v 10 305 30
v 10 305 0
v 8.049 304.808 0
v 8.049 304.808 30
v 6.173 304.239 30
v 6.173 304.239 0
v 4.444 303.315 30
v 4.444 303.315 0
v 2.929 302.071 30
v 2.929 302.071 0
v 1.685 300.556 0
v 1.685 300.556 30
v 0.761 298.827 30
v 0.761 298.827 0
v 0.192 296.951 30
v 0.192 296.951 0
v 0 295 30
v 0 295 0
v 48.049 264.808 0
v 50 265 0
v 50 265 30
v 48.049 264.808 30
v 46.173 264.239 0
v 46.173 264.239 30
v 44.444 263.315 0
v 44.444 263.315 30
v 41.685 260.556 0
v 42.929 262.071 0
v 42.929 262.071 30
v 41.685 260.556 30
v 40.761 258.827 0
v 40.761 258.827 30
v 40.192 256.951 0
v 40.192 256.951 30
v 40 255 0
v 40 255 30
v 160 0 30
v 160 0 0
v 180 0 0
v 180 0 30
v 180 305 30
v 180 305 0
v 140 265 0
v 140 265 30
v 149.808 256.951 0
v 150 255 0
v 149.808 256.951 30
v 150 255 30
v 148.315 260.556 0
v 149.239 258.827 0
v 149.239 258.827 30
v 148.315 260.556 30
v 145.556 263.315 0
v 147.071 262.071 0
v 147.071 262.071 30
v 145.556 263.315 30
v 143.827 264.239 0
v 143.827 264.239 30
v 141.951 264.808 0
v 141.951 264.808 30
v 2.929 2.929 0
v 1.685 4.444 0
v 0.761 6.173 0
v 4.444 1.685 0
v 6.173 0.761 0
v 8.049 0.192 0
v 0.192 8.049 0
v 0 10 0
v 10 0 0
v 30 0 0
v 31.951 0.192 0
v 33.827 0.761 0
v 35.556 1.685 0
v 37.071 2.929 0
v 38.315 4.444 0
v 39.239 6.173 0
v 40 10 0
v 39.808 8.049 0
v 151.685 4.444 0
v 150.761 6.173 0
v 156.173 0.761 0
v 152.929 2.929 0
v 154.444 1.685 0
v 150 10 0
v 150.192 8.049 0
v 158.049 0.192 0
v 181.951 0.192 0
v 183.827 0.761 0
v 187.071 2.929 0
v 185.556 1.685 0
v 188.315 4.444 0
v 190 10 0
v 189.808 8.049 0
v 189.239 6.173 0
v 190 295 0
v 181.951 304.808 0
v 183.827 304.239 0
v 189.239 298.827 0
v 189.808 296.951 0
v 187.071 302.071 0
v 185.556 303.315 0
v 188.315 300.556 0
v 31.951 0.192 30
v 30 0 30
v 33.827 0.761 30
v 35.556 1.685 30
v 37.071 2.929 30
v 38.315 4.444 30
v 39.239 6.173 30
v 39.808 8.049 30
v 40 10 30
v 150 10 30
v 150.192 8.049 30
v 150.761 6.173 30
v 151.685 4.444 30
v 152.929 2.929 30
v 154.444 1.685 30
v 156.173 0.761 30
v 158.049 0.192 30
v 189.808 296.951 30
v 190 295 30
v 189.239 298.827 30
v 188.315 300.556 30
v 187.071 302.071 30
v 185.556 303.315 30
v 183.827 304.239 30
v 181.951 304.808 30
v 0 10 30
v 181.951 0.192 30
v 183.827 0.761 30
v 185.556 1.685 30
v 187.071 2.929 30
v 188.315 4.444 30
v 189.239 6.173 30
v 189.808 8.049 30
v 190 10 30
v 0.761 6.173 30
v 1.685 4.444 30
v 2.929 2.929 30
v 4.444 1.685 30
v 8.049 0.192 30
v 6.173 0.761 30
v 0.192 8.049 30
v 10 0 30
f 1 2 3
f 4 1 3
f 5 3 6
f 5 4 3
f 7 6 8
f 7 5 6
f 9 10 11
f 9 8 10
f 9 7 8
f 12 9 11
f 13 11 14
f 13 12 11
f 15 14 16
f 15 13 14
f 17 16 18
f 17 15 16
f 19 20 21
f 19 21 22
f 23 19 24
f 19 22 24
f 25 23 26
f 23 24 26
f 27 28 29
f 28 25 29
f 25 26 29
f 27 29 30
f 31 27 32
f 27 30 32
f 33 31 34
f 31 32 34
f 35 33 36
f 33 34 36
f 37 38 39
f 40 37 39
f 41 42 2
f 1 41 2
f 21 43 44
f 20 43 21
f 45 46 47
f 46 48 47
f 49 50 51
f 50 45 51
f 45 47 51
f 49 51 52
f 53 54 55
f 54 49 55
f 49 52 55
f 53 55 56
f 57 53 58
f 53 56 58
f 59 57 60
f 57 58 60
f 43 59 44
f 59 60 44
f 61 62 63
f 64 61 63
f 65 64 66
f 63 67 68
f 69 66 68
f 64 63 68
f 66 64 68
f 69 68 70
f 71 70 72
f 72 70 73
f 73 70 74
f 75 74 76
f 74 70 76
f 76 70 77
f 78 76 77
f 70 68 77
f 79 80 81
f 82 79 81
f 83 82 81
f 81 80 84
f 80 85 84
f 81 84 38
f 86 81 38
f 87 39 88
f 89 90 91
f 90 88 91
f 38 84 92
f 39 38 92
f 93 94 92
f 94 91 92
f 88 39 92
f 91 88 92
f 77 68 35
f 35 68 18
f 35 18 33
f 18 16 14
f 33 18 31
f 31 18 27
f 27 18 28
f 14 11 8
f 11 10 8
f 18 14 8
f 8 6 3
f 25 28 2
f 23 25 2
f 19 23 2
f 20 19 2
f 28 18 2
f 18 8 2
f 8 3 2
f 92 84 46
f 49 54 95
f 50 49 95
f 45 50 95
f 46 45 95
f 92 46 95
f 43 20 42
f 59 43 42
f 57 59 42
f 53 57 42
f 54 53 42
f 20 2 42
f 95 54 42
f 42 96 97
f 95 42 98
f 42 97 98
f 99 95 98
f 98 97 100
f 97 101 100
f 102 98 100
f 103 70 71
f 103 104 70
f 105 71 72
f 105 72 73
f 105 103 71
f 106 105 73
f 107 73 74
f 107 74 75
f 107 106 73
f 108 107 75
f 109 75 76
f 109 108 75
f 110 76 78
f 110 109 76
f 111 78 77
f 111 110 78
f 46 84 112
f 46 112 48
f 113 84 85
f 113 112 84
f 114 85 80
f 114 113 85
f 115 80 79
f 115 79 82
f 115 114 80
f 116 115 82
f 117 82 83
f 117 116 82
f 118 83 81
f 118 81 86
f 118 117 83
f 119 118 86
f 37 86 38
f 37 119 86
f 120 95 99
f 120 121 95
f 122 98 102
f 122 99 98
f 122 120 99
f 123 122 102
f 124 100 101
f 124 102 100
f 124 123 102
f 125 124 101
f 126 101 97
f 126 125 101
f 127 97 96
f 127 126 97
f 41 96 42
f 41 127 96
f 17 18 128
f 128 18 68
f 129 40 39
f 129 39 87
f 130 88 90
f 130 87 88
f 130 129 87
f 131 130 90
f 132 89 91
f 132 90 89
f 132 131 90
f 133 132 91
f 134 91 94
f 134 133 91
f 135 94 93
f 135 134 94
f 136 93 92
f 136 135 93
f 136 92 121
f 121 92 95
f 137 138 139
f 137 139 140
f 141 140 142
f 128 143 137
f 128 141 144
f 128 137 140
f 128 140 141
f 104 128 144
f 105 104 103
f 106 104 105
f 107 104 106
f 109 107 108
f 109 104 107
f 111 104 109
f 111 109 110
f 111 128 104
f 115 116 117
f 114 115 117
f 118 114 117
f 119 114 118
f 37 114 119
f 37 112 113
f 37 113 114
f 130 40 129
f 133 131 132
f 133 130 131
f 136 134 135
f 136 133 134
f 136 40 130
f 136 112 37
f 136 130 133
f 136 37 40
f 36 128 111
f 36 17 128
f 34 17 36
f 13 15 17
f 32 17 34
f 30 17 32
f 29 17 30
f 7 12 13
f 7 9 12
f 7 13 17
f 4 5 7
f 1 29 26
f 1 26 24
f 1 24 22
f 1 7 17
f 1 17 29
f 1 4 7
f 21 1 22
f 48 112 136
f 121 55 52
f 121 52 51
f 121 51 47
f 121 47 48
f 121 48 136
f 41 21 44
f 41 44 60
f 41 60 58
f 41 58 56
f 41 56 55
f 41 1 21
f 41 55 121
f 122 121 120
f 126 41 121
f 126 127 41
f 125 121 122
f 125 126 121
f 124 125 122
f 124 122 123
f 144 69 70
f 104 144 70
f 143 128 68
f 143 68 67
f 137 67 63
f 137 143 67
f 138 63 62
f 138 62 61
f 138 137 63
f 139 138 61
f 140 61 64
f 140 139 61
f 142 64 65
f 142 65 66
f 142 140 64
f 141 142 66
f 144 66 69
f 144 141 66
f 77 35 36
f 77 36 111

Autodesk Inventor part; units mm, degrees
ref_plane "YZ Plane" through (0, 0, 0) normal (1, 0, 0) x (0, 1, 0)
ref_plane "XZ Plane" through (0, 0, 0) normal (0, 1, 0) x (-1, 0, 0)
ref_plane "XY Plane" through (0, 0, 0) normal (0, 0, 1) x (1, 0, 0)
sketch "スケッチ1" plane through (0, 0, 0) normal (0, 0, 1) x (1, 0, 0)
  line L0 (0, 0) -> (190, 0)
  line L1 (190, 0) -> (190, 305)
  line L2 (190, 305) -> (0, 305)
  line L3 (0, 305) -> (0, 0)
  line L4 (0, 305) -> (40, 305)
  line L5 (40, 305) -> (40, 0)
  line L6 (40, 0) -> (0, 0)
  line L7 (0, 0) -> (0, 305)
  line L8 (190, 0) -> (150, 0)
  line L9 (150, 0) -> (150, 305)
  line L10 (150, 305) -> (190, 305)
  line L11 (190, 305) -> (190, 0)
  line L12 (0, 305) -> (190, 305)
  line L13 (190, 305) -> (190, 265)
  line L14 (190, 265) -> (0, 265)
  line L15 (0, 265) -> (0, 305)
  point P0 (40, 265)
  point P1 (150, 265)
  dimension "d0" = 305
  dimension "d1" = 190
  dimension "d2" = 40
  dimension "d3" = 40
  dimension "d4" = 40
extrude "押し出し1" add sketch "スケッチ1" along normal blind 30 contours L3 L14 L5 L0 | L3 L2 L5 L14 | L9 L14 L1 L0 | L5 L2 L9 L14 | L9 L2 L1 L14
fillet "フィレット1" radius 10 8 edges at (0, 305, 15) (0, 0, 15) (190, 305, 15) (40, 265, 15) (150, 265, 15) (150, 0, 15) (190, 0, 15) (40, 0, 15)
equation "\"d3\" = d2"
equation "\"d4\" = d2"
properties part number "BP_cover"
